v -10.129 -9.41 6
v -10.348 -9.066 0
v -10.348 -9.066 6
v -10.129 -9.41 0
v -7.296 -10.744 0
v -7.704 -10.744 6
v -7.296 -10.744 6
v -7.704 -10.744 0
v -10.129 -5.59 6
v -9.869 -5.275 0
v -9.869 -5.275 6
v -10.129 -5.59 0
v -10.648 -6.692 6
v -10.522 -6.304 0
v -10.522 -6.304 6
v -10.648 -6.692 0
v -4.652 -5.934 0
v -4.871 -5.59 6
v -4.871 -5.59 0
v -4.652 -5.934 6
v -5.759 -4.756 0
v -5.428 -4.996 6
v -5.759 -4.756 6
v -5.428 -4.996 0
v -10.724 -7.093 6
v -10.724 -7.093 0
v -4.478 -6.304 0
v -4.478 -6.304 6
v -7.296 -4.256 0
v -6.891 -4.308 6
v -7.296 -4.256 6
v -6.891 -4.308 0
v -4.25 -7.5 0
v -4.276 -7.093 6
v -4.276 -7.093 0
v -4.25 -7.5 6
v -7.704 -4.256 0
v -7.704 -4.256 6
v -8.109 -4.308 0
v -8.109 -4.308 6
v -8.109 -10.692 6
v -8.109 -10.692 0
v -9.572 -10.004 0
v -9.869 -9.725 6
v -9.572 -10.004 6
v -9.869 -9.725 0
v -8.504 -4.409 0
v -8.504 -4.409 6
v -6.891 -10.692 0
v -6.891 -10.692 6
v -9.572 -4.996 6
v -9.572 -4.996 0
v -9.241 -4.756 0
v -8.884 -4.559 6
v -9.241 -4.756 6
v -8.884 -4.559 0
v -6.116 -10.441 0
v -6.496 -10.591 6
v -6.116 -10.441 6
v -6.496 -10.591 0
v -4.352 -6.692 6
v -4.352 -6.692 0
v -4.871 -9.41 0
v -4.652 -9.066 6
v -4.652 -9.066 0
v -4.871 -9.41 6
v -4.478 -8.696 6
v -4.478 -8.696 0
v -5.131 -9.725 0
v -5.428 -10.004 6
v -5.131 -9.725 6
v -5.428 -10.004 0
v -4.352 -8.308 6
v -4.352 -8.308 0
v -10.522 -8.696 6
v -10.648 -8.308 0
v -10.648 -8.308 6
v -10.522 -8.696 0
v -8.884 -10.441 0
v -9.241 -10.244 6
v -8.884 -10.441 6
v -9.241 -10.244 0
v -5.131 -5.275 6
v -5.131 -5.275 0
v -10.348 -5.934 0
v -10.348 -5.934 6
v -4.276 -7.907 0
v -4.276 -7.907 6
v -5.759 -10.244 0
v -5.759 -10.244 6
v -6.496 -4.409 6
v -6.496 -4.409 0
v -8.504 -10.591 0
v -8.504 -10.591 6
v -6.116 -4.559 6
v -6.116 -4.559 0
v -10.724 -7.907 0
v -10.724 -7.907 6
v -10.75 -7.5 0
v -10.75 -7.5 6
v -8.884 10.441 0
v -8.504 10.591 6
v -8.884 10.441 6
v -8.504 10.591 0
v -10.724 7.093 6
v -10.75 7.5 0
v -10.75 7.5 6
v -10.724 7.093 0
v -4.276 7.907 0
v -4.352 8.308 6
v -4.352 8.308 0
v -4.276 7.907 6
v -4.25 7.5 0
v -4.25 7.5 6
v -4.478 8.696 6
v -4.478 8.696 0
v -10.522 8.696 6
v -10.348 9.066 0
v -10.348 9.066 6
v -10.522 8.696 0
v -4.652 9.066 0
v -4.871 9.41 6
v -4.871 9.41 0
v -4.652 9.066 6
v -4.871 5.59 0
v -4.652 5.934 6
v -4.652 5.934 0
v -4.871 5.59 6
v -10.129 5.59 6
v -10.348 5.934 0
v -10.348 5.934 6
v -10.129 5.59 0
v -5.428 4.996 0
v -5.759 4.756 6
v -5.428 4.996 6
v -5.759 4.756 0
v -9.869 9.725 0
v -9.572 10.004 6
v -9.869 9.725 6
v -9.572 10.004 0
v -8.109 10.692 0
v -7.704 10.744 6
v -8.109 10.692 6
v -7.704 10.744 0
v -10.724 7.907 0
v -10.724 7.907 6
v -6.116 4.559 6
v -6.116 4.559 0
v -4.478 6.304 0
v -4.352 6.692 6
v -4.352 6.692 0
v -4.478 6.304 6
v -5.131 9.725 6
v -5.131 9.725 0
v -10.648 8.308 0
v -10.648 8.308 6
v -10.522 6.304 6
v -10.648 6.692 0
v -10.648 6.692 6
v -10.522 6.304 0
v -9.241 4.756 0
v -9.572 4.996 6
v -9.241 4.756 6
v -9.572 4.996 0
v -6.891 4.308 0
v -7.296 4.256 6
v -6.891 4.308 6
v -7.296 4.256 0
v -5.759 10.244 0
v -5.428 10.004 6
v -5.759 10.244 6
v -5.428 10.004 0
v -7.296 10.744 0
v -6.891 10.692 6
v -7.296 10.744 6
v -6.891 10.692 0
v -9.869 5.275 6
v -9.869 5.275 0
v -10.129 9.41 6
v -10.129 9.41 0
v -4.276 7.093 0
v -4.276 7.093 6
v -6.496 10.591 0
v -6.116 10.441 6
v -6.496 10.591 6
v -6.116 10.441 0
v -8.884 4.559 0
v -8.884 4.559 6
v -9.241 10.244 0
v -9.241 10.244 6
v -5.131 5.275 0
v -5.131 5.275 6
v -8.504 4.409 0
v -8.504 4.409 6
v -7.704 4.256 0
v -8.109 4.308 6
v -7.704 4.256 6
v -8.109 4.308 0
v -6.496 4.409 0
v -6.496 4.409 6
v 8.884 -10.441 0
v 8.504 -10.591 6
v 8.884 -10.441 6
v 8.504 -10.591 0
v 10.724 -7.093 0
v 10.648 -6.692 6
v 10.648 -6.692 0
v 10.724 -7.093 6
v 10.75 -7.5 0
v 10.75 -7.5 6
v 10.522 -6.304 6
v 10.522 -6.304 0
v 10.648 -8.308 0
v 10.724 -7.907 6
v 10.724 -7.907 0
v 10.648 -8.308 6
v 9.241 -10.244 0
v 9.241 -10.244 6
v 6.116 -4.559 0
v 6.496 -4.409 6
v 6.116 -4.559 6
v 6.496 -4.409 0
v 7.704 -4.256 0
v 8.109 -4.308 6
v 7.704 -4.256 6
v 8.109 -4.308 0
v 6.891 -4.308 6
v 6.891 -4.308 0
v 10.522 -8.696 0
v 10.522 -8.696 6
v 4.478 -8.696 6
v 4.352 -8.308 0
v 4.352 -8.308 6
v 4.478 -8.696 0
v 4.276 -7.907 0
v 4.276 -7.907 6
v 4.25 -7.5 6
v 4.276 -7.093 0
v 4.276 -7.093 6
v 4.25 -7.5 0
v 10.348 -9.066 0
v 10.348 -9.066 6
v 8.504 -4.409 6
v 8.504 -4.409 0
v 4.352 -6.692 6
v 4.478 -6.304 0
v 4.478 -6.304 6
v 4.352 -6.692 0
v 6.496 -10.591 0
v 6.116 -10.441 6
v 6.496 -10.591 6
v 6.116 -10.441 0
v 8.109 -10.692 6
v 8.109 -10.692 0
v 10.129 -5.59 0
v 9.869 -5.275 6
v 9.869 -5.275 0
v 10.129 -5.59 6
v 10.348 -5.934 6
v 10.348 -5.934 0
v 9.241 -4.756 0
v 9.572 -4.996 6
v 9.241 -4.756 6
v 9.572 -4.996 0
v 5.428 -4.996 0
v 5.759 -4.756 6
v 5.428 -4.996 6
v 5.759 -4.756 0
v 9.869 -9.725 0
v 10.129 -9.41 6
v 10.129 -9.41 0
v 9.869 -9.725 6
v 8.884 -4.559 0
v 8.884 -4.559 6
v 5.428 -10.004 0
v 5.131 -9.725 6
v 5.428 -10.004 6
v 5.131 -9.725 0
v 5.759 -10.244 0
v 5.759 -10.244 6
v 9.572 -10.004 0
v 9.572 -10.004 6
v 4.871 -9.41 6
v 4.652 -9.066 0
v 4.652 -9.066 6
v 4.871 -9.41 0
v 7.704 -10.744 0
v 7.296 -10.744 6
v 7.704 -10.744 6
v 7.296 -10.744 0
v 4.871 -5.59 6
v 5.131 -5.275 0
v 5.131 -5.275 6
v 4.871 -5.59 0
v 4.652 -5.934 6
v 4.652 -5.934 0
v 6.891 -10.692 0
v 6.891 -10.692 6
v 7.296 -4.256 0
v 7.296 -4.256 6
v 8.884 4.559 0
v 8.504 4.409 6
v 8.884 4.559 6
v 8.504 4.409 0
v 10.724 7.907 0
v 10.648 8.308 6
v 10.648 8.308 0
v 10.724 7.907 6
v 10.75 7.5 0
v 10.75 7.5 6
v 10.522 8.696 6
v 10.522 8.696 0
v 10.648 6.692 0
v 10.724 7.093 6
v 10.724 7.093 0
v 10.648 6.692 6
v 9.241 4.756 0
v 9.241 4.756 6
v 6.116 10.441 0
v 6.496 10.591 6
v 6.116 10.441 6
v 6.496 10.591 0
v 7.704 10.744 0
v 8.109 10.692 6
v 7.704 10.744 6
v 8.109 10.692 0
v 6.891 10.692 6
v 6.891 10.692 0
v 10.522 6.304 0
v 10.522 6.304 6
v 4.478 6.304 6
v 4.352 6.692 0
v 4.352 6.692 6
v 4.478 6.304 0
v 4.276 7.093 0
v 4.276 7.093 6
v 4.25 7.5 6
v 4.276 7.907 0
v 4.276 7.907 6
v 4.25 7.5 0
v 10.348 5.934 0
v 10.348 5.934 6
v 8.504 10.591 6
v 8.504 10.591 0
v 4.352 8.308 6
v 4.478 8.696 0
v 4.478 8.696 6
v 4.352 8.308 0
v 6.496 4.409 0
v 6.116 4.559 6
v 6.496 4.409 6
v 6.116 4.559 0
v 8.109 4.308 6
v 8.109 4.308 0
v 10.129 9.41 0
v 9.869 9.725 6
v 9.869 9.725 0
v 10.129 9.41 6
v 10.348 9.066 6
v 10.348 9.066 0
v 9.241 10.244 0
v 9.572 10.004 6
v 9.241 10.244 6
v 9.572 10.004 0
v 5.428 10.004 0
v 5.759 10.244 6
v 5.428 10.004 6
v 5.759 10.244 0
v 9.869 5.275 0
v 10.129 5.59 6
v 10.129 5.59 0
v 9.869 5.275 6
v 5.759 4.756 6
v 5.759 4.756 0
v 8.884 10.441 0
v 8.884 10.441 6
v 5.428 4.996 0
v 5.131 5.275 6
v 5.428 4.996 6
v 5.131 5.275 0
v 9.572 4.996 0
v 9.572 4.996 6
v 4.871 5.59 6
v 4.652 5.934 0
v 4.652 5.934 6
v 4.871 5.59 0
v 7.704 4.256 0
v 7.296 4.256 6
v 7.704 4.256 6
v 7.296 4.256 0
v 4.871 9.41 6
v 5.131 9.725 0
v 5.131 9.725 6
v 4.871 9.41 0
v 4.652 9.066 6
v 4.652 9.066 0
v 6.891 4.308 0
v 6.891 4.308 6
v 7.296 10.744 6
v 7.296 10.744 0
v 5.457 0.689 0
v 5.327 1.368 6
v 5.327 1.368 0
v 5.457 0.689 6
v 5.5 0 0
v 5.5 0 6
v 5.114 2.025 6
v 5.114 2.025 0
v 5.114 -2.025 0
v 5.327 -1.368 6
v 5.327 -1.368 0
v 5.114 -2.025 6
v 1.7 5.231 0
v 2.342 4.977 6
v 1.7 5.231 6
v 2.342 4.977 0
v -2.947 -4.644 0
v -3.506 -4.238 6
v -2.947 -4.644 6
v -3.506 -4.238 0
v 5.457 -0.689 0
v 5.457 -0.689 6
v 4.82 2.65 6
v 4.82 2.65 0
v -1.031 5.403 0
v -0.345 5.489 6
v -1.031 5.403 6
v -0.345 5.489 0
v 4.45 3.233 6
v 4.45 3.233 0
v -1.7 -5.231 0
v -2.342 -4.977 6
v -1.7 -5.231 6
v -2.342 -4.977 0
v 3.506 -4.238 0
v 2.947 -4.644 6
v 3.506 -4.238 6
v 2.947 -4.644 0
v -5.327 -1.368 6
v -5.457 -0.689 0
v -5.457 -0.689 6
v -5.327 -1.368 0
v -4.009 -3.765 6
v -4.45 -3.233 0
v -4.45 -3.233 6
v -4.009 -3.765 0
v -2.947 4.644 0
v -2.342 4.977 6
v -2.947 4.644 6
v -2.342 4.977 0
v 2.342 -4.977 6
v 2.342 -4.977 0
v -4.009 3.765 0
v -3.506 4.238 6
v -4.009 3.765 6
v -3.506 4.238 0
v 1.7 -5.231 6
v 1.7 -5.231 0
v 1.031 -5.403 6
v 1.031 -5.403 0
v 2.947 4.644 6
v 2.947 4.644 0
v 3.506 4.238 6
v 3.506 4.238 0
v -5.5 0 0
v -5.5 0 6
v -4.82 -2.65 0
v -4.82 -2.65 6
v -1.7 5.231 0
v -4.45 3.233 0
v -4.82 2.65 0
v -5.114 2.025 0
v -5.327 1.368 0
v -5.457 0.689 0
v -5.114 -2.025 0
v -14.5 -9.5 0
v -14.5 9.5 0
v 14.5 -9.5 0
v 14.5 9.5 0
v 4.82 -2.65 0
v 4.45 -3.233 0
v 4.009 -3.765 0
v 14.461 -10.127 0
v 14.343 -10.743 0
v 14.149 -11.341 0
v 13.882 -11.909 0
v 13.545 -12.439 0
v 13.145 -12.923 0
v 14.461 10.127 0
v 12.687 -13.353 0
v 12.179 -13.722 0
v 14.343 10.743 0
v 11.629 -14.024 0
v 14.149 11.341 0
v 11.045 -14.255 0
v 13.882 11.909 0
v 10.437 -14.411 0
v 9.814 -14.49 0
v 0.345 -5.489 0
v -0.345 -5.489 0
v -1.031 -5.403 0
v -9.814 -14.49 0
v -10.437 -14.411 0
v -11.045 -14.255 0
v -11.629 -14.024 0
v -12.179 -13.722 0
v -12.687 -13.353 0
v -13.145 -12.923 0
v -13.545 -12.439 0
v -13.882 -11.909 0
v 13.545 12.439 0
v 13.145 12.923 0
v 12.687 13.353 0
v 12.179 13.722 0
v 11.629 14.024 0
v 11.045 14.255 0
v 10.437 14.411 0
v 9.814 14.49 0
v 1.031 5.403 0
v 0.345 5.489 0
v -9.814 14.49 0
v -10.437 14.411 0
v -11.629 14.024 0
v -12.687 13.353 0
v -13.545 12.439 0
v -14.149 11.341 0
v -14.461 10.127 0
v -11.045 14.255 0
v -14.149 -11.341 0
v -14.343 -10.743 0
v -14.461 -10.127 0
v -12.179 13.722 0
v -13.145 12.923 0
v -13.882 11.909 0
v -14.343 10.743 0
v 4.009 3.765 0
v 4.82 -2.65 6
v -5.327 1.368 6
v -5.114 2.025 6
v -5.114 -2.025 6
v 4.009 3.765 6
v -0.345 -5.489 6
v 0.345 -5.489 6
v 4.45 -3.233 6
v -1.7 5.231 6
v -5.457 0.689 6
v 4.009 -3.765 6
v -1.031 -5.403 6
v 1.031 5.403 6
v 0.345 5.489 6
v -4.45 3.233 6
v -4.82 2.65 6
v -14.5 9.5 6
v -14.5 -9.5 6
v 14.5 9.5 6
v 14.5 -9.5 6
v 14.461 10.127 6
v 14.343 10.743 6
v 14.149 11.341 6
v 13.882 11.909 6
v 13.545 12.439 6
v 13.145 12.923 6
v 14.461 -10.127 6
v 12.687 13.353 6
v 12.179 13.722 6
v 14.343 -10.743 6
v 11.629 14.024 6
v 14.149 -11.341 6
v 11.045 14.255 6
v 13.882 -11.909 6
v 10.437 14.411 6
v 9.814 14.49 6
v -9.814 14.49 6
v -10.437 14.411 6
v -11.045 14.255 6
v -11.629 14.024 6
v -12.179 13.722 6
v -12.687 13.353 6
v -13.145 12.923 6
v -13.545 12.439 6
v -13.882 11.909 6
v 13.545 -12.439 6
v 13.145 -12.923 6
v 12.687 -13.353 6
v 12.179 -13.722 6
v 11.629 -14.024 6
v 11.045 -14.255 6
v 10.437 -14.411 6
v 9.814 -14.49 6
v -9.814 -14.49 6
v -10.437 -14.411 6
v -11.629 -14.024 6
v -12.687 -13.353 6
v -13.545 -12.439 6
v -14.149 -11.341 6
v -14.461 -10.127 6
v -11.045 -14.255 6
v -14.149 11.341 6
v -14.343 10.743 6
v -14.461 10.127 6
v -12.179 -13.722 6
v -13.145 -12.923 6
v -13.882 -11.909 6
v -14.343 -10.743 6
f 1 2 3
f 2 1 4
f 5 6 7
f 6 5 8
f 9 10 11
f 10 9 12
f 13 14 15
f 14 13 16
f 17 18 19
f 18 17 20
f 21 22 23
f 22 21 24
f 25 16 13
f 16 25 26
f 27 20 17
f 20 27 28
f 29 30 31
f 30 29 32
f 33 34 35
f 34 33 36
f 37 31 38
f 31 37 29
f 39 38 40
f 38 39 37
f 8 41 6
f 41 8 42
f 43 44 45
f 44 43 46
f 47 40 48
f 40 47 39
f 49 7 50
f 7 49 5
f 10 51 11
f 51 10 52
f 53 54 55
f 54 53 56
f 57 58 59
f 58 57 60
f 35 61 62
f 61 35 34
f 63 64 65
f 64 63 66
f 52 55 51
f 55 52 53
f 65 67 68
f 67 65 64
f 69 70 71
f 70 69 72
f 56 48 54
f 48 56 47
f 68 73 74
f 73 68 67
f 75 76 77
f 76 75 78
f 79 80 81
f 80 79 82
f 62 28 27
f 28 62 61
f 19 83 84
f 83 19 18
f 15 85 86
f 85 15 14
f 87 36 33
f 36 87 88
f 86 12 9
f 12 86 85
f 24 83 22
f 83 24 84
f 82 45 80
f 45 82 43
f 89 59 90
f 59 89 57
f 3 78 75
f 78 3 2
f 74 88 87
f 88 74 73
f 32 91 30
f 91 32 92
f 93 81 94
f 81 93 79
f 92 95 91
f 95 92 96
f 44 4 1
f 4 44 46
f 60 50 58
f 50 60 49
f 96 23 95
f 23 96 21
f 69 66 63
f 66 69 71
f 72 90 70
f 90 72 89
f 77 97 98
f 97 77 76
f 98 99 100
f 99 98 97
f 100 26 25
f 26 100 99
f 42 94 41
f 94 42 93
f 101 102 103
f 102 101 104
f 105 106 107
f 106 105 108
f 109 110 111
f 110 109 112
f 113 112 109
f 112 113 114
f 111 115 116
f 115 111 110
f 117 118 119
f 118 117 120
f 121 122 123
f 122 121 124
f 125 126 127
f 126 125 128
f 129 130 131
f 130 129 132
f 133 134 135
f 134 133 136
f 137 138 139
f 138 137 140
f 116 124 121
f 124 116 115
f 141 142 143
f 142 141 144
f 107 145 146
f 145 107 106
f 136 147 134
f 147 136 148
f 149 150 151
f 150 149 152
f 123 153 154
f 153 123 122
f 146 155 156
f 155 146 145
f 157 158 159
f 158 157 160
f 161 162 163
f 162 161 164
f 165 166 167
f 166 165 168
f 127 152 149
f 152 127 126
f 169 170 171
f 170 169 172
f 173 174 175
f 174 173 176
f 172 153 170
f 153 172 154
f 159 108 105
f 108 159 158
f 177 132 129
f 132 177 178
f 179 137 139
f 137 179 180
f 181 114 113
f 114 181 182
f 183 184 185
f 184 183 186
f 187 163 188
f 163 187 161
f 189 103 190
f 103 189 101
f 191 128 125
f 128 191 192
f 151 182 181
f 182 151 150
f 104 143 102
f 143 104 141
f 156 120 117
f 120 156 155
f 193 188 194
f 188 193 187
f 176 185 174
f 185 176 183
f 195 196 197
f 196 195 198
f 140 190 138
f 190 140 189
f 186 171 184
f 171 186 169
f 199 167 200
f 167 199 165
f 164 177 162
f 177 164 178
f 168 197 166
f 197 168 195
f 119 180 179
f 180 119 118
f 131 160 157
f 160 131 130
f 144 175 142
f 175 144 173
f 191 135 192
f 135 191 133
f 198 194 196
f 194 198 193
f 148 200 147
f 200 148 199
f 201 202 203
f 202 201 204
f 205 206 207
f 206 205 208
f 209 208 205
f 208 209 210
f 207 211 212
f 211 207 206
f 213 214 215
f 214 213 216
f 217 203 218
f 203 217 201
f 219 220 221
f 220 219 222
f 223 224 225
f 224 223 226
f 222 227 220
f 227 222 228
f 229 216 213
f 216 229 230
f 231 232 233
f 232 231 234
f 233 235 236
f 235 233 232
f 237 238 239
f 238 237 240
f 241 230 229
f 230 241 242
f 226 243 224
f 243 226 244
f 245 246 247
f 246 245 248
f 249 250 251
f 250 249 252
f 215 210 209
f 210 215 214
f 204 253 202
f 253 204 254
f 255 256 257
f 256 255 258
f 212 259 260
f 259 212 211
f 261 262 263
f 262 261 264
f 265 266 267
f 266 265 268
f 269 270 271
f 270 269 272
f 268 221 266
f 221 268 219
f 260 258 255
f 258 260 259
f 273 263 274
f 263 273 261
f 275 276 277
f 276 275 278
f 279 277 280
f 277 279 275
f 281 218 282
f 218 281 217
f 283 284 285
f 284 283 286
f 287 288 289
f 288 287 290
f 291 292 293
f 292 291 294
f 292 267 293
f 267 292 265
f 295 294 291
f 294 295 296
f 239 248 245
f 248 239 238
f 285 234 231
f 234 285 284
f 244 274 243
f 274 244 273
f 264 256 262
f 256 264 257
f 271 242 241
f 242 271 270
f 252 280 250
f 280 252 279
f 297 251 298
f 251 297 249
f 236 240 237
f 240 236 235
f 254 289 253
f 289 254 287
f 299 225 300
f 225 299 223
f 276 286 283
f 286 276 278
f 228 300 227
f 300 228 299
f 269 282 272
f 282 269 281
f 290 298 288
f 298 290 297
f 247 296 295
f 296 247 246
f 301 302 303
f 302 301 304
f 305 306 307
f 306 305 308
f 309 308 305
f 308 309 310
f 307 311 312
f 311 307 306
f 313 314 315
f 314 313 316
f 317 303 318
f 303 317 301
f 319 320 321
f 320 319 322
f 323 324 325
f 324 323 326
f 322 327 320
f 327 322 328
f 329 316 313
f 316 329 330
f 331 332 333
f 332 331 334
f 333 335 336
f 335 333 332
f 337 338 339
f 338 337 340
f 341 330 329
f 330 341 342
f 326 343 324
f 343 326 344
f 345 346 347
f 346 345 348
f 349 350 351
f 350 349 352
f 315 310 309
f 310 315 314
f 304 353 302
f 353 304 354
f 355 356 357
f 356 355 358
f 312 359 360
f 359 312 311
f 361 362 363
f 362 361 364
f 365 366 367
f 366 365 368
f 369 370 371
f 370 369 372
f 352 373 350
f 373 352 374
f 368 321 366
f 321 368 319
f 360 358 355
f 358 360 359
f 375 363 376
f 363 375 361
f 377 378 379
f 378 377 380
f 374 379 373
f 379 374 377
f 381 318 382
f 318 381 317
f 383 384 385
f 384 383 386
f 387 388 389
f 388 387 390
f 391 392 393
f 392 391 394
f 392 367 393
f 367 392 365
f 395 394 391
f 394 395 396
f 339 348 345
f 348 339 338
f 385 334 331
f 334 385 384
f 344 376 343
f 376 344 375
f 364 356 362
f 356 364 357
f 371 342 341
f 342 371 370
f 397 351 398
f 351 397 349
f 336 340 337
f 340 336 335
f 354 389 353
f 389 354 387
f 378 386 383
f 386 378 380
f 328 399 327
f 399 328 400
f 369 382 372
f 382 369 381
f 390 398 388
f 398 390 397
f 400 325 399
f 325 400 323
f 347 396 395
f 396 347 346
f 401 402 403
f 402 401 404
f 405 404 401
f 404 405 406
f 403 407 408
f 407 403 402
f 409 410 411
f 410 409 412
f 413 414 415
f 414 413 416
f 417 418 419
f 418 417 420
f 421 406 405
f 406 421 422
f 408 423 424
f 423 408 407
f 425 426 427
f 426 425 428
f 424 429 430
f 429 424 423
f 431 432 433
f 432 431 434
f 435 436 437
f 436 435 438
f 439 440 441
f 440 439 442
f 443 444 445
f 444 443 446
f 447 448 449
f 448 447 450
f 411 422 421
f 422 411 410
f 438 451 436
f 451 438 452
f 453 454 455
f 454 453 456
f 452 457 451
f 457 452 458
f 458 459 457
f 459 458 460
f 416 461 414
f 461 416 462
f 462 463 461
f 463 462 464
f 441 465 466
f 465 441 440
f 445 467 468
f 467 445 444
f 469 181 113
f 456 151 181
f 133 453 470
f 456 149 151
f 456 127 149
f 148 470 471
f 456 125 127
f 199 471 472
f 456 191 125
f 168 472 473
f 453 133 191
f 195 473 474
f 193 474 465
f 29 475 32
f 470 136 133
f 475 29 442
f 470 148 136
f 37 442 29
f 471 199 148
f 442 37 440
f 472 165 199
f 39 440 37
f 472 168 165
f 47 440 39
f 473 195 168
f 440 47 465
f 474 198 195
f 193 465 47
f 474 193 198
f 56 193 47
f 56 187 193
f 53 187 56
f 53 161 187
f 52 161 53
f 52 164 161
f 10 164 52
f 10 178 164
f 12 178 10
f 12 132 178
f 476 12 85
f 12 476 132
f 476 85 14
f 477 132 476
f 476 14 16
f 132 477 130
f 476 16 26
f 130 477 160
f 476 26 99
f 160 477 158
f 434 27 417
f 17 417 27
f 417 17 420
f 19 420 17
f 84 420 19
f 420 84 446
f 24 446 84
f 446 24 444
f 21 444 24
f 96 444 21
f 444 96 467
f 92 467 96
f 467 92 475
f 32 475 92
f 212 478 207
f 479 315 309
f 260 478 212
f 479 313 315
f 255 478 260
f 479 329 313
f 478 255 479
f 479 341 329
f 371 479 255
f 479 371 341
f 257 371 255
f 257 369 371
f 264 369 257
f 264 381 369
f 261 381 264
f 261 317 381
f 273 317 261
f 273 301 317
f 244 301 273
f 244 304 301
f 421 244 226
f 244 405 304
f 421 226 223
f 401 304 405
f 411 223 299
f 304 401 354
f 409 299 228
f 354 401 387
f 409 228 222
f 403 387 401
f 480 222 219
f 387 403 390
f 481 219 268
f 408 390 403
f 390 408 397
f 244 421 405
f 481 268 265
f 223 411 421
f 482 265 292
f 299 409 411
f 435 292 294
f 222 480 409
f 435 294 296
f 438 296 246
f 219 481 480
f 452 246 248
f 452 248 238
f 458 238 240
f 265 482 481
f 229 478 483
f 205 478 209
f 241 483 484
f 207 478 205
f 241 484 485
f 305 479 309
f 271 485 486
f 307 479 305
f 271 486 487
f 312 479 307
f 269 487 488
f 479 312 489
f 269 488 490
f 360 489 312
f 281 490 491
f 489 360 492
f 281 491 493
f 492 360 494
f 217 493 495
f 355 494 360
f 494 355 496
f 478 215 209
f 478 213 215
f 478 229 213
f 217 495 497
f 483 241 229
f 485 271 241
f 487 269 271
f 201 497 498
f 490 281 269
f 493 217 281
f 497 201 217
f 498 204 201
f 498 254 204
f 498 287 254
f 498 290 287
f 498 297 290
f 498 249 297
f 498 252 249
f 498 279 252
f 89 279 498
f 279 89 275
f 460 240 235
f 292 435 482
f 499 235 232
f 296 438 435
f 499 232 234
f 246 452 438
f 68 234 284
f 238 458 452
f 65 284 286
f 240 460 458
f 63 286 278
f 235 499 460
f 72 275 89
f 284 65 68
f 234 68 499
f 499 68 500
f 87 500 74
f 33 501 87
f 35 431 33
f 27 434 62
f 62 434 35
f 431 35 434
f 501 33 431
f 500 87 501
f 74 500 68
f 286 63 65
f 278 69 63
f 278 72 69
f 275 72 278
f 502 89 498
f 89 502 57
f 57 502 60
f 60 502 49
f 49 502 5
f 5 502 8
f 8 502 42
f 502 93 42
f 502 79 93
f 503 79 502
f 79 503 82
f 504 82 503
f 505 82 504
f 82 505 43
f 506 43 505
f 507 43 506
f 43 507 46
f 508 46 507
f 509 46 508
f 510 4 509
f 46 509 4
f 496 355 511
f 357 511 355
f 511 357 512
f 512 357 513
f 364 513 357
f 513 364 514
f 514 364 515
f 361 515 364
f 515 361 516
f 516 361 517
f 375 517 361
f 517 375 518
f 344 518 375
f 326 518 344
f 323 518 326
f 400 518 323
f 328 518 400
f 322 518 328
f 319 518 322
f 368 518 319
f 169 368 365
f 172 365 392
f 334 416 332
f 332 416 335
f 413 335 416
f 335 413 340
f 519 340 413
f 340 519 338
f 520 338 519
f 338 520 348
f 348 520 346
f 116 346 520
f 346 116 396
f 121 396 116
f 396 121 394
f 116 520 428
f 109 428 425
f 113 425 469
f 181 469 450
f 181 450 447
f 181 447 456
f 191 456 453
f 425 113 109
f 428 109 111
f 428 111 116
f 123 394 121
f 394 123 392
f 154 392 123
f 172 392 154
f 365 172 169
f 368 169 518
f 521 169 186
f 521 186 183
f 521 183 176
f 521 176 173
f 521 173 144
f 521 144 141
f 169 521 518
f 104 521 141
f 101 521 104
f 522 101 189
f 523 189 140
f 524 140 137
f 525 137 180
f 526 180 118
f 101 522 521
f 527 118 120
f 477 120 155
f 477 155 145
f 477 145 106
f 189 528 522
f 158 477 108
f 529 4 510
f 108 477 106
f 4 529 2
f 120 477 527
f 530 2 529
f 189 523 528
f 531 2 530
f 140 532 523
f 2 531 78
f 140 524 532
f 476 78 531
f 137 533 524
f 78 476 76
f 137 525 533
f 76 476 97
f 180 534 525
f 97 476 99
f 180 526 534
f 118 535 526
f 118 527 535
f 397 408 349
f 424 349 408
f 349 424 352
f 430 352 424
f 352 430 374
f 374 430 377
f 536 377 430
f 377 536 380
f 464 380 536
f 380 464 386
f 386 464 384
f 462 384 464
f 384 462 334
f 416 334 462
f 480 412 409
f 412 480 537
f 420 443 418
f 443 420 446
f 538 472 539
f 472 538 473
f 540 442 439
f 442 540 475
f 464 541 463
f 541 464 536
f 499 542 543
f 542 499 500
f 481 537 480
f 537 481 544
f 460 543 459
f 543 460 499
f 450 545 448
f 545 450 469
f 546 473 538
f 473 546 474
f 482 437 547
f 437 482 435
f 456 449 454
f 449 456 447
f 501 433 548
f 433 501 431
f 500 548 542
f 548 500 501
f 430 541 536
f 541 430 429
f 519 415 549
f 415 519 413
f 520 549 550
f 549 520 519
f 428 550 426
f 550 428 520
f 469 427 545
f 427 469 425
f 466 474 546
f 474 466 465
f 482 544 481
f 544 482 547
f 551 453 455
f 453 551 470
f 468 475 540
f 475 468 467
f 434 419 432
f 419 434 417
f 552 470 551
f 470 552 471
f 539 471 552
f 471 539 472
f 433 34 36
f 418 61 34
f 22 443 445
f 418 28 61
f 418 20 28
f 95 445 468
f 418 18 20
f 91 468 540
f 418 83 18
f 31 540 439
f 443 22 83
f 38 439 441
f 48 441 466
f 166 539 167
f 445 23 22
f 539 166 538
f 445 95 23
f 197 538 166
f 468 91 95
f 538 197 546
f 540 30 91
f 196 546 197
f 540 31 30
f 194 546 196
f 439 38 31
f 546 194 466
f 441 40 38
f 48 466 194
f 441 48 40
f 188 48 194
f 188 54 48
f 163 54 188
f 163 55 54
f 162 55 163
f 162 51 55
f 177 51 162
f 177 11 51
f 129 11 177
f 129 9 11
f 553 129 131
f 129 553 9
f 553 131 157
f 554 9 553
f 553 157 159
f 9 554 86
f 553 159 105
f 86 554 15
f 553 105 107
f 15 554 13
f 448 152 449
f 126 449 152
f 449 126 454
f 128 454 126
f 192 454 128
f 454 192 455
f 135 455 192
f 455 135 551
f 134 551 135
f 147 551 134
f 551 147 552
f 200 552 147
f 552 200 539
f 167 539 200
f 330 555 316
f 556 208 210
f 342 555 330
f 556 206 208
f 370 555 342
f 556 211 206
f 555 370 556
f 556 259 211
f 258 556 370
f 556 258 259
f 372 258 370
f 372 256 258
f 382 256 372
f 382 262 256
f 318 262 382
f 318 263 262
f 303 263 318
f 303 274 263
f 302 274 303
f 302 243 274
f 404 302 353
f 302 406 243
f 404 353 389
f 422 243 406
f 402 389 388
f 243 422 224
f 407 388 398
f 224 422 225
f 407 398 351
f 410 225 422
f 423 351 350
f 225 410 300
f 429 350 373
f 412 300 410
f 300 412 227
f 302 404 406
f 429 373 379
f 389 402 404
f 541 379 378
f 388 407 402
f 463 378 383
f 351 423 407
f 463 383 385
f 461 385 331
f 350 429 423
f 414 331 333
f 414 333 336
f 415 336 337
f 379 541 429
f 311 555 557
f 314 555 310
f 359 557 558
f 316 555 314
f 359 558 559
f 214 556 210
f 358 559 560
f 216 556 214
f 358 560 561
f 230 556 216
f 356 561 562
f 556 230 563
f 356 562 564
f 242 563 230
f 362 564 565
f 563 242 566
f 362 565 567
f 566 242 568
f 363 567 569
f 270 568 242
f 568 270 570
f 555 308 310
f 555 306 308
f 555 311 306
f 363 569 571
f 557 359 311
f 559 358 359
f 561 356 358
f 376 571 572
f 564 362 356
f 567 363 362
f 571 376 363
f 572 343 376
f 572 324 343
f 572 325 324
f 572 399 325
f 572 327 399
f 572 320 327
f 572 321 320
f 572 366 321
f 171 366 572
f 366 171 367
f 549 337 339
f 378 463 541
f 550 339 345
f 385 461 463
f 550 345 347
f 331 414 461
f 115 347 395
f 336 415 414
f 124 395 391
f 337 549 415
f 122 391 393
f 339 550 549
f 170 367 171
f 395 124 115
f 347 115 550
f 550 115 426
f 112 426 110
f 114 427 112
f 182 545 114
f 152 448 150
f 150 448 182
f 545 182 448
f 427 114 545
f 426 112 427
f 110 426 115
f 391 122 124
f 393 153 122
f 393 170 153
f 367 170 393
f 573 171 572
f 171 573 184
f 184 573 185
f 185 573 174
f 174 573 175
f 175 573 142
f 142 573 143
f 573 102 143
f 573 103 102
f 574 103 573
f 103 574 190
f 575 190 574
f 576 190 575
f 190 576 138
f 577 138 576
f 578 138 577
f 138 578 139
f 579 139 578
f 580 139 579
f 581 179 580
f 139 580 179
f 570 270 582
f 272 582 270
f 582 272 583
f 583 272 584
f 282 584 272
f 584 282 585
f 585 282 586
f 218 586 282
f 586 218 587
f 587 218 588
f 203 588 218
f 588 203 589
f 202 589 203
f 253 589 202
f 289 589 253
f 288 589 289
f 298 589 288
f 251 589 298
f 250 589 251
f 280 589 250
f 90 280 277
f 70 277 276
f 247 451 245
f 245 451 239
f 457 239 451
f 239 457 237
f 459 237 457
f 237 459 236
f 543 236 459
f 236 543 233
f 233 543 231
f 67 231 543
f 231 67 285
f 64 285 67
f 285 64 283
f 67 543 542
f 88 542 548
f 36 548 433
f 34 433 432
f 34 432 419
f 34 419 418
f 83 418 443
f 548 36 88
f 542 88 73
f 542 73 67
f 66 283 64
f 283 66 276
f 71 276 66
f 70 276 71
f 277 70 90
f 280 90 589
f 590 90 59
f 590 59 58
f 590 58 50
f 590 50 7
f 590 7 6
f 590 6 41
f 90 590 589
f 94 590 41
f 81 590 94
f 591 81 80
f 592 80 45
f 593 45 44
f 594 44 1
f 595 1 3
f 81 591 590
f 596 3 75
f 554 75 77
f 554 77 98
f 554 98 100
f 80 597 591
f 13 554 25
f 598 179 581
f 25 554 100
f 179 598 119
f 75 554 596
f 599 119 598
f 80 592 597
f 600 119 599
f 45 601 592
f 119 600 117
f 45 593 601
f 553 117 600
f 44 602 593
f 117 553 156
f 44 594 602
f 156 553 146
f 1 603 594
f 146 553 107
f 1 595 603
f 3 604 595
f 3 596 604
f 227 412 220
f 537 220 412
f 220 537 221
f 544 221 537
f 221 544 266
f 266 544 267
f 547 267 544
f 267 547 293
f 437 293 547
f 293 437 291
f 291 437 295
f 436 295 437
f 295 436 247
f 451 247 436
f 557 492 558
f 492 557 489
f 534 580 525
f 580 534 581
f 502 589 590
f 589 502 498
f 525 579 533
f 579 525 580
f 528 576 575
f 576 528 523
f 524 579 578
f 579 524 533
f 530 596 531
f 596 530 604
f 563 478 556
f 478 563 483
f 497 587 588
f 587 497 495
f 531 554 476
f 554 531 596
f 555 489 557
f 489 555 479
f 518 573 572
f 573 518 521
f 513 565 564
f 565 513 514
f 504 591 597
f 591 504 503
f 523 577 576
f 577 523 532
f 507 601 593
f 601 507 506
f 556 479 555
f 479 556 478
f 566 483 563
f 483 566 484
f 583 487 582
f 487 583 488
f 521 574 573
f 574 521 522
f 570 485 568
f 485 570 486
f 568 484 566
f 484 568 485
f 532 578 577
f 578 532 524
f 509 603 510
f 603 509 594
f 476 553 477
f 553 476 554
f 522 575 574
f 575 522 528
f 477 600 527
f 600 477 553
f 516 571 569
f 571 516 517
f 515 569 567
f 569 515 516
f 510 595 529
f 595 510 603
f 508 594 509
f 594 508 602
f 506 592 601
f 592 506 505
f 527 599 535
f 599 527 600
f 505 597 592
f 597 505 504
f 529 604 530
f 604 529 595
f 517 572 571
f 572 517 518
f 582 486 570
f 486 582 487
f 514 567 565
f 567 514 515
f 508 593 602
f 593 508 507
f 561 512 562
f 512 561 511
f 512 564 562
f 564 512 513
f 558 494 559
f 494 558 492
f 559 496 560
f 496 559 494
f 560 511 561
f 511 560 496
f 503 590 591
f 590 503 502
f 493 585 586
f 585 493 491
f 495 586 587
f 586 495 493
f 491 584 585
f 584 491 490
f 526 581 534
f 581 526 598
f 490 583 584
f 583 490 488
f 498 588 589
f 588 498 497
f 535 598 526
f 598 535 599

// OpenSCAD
$fn = 50;


difference() {
	union() {
		hull() {
			translate(v = [-9.5000000000, 9.5000000000, 0]) {
				cylinder(h = 6, r = 5);
			}
			translate(v = [9.5000000000, 9.5000000000, 0]) {
				cylinder(h = 6, r = 5);
			}
			translate(v = [-9.5000000000, -9.5000000000, 0]) {
				cylinder(h = 6, r = 5);
			}
			translate(v = [9.5000000000, -9.5000000000, 0]) {
				cylinder(h = 6, r = 5);
			}
		}
	}
	union() {
		#translate(v = [-7.5000000000, -7.5000000000, -100.0000000000]) {
			cylinder(h = 200, r = 3.2500000000);
		}
		#translate(v = [-7.5000000000, 7.5000000000, -100.0000000000]) {
			cylinder(h = 200, r = 3.2500000000);
		}
		#translate(v = [7.5000000000, -7.5000000000, -100.0000000000]) {
			cylinder(h = 200, r = 3.2500000000);
		}
		#translate(v = [7.5000000000, 7.5000000000, -100.0000000000]) {
			cylinder(h = 200, r = 3.2500000000);
		}
		#cylinder(h = 6, r = 5.5000000000);
	}
}
